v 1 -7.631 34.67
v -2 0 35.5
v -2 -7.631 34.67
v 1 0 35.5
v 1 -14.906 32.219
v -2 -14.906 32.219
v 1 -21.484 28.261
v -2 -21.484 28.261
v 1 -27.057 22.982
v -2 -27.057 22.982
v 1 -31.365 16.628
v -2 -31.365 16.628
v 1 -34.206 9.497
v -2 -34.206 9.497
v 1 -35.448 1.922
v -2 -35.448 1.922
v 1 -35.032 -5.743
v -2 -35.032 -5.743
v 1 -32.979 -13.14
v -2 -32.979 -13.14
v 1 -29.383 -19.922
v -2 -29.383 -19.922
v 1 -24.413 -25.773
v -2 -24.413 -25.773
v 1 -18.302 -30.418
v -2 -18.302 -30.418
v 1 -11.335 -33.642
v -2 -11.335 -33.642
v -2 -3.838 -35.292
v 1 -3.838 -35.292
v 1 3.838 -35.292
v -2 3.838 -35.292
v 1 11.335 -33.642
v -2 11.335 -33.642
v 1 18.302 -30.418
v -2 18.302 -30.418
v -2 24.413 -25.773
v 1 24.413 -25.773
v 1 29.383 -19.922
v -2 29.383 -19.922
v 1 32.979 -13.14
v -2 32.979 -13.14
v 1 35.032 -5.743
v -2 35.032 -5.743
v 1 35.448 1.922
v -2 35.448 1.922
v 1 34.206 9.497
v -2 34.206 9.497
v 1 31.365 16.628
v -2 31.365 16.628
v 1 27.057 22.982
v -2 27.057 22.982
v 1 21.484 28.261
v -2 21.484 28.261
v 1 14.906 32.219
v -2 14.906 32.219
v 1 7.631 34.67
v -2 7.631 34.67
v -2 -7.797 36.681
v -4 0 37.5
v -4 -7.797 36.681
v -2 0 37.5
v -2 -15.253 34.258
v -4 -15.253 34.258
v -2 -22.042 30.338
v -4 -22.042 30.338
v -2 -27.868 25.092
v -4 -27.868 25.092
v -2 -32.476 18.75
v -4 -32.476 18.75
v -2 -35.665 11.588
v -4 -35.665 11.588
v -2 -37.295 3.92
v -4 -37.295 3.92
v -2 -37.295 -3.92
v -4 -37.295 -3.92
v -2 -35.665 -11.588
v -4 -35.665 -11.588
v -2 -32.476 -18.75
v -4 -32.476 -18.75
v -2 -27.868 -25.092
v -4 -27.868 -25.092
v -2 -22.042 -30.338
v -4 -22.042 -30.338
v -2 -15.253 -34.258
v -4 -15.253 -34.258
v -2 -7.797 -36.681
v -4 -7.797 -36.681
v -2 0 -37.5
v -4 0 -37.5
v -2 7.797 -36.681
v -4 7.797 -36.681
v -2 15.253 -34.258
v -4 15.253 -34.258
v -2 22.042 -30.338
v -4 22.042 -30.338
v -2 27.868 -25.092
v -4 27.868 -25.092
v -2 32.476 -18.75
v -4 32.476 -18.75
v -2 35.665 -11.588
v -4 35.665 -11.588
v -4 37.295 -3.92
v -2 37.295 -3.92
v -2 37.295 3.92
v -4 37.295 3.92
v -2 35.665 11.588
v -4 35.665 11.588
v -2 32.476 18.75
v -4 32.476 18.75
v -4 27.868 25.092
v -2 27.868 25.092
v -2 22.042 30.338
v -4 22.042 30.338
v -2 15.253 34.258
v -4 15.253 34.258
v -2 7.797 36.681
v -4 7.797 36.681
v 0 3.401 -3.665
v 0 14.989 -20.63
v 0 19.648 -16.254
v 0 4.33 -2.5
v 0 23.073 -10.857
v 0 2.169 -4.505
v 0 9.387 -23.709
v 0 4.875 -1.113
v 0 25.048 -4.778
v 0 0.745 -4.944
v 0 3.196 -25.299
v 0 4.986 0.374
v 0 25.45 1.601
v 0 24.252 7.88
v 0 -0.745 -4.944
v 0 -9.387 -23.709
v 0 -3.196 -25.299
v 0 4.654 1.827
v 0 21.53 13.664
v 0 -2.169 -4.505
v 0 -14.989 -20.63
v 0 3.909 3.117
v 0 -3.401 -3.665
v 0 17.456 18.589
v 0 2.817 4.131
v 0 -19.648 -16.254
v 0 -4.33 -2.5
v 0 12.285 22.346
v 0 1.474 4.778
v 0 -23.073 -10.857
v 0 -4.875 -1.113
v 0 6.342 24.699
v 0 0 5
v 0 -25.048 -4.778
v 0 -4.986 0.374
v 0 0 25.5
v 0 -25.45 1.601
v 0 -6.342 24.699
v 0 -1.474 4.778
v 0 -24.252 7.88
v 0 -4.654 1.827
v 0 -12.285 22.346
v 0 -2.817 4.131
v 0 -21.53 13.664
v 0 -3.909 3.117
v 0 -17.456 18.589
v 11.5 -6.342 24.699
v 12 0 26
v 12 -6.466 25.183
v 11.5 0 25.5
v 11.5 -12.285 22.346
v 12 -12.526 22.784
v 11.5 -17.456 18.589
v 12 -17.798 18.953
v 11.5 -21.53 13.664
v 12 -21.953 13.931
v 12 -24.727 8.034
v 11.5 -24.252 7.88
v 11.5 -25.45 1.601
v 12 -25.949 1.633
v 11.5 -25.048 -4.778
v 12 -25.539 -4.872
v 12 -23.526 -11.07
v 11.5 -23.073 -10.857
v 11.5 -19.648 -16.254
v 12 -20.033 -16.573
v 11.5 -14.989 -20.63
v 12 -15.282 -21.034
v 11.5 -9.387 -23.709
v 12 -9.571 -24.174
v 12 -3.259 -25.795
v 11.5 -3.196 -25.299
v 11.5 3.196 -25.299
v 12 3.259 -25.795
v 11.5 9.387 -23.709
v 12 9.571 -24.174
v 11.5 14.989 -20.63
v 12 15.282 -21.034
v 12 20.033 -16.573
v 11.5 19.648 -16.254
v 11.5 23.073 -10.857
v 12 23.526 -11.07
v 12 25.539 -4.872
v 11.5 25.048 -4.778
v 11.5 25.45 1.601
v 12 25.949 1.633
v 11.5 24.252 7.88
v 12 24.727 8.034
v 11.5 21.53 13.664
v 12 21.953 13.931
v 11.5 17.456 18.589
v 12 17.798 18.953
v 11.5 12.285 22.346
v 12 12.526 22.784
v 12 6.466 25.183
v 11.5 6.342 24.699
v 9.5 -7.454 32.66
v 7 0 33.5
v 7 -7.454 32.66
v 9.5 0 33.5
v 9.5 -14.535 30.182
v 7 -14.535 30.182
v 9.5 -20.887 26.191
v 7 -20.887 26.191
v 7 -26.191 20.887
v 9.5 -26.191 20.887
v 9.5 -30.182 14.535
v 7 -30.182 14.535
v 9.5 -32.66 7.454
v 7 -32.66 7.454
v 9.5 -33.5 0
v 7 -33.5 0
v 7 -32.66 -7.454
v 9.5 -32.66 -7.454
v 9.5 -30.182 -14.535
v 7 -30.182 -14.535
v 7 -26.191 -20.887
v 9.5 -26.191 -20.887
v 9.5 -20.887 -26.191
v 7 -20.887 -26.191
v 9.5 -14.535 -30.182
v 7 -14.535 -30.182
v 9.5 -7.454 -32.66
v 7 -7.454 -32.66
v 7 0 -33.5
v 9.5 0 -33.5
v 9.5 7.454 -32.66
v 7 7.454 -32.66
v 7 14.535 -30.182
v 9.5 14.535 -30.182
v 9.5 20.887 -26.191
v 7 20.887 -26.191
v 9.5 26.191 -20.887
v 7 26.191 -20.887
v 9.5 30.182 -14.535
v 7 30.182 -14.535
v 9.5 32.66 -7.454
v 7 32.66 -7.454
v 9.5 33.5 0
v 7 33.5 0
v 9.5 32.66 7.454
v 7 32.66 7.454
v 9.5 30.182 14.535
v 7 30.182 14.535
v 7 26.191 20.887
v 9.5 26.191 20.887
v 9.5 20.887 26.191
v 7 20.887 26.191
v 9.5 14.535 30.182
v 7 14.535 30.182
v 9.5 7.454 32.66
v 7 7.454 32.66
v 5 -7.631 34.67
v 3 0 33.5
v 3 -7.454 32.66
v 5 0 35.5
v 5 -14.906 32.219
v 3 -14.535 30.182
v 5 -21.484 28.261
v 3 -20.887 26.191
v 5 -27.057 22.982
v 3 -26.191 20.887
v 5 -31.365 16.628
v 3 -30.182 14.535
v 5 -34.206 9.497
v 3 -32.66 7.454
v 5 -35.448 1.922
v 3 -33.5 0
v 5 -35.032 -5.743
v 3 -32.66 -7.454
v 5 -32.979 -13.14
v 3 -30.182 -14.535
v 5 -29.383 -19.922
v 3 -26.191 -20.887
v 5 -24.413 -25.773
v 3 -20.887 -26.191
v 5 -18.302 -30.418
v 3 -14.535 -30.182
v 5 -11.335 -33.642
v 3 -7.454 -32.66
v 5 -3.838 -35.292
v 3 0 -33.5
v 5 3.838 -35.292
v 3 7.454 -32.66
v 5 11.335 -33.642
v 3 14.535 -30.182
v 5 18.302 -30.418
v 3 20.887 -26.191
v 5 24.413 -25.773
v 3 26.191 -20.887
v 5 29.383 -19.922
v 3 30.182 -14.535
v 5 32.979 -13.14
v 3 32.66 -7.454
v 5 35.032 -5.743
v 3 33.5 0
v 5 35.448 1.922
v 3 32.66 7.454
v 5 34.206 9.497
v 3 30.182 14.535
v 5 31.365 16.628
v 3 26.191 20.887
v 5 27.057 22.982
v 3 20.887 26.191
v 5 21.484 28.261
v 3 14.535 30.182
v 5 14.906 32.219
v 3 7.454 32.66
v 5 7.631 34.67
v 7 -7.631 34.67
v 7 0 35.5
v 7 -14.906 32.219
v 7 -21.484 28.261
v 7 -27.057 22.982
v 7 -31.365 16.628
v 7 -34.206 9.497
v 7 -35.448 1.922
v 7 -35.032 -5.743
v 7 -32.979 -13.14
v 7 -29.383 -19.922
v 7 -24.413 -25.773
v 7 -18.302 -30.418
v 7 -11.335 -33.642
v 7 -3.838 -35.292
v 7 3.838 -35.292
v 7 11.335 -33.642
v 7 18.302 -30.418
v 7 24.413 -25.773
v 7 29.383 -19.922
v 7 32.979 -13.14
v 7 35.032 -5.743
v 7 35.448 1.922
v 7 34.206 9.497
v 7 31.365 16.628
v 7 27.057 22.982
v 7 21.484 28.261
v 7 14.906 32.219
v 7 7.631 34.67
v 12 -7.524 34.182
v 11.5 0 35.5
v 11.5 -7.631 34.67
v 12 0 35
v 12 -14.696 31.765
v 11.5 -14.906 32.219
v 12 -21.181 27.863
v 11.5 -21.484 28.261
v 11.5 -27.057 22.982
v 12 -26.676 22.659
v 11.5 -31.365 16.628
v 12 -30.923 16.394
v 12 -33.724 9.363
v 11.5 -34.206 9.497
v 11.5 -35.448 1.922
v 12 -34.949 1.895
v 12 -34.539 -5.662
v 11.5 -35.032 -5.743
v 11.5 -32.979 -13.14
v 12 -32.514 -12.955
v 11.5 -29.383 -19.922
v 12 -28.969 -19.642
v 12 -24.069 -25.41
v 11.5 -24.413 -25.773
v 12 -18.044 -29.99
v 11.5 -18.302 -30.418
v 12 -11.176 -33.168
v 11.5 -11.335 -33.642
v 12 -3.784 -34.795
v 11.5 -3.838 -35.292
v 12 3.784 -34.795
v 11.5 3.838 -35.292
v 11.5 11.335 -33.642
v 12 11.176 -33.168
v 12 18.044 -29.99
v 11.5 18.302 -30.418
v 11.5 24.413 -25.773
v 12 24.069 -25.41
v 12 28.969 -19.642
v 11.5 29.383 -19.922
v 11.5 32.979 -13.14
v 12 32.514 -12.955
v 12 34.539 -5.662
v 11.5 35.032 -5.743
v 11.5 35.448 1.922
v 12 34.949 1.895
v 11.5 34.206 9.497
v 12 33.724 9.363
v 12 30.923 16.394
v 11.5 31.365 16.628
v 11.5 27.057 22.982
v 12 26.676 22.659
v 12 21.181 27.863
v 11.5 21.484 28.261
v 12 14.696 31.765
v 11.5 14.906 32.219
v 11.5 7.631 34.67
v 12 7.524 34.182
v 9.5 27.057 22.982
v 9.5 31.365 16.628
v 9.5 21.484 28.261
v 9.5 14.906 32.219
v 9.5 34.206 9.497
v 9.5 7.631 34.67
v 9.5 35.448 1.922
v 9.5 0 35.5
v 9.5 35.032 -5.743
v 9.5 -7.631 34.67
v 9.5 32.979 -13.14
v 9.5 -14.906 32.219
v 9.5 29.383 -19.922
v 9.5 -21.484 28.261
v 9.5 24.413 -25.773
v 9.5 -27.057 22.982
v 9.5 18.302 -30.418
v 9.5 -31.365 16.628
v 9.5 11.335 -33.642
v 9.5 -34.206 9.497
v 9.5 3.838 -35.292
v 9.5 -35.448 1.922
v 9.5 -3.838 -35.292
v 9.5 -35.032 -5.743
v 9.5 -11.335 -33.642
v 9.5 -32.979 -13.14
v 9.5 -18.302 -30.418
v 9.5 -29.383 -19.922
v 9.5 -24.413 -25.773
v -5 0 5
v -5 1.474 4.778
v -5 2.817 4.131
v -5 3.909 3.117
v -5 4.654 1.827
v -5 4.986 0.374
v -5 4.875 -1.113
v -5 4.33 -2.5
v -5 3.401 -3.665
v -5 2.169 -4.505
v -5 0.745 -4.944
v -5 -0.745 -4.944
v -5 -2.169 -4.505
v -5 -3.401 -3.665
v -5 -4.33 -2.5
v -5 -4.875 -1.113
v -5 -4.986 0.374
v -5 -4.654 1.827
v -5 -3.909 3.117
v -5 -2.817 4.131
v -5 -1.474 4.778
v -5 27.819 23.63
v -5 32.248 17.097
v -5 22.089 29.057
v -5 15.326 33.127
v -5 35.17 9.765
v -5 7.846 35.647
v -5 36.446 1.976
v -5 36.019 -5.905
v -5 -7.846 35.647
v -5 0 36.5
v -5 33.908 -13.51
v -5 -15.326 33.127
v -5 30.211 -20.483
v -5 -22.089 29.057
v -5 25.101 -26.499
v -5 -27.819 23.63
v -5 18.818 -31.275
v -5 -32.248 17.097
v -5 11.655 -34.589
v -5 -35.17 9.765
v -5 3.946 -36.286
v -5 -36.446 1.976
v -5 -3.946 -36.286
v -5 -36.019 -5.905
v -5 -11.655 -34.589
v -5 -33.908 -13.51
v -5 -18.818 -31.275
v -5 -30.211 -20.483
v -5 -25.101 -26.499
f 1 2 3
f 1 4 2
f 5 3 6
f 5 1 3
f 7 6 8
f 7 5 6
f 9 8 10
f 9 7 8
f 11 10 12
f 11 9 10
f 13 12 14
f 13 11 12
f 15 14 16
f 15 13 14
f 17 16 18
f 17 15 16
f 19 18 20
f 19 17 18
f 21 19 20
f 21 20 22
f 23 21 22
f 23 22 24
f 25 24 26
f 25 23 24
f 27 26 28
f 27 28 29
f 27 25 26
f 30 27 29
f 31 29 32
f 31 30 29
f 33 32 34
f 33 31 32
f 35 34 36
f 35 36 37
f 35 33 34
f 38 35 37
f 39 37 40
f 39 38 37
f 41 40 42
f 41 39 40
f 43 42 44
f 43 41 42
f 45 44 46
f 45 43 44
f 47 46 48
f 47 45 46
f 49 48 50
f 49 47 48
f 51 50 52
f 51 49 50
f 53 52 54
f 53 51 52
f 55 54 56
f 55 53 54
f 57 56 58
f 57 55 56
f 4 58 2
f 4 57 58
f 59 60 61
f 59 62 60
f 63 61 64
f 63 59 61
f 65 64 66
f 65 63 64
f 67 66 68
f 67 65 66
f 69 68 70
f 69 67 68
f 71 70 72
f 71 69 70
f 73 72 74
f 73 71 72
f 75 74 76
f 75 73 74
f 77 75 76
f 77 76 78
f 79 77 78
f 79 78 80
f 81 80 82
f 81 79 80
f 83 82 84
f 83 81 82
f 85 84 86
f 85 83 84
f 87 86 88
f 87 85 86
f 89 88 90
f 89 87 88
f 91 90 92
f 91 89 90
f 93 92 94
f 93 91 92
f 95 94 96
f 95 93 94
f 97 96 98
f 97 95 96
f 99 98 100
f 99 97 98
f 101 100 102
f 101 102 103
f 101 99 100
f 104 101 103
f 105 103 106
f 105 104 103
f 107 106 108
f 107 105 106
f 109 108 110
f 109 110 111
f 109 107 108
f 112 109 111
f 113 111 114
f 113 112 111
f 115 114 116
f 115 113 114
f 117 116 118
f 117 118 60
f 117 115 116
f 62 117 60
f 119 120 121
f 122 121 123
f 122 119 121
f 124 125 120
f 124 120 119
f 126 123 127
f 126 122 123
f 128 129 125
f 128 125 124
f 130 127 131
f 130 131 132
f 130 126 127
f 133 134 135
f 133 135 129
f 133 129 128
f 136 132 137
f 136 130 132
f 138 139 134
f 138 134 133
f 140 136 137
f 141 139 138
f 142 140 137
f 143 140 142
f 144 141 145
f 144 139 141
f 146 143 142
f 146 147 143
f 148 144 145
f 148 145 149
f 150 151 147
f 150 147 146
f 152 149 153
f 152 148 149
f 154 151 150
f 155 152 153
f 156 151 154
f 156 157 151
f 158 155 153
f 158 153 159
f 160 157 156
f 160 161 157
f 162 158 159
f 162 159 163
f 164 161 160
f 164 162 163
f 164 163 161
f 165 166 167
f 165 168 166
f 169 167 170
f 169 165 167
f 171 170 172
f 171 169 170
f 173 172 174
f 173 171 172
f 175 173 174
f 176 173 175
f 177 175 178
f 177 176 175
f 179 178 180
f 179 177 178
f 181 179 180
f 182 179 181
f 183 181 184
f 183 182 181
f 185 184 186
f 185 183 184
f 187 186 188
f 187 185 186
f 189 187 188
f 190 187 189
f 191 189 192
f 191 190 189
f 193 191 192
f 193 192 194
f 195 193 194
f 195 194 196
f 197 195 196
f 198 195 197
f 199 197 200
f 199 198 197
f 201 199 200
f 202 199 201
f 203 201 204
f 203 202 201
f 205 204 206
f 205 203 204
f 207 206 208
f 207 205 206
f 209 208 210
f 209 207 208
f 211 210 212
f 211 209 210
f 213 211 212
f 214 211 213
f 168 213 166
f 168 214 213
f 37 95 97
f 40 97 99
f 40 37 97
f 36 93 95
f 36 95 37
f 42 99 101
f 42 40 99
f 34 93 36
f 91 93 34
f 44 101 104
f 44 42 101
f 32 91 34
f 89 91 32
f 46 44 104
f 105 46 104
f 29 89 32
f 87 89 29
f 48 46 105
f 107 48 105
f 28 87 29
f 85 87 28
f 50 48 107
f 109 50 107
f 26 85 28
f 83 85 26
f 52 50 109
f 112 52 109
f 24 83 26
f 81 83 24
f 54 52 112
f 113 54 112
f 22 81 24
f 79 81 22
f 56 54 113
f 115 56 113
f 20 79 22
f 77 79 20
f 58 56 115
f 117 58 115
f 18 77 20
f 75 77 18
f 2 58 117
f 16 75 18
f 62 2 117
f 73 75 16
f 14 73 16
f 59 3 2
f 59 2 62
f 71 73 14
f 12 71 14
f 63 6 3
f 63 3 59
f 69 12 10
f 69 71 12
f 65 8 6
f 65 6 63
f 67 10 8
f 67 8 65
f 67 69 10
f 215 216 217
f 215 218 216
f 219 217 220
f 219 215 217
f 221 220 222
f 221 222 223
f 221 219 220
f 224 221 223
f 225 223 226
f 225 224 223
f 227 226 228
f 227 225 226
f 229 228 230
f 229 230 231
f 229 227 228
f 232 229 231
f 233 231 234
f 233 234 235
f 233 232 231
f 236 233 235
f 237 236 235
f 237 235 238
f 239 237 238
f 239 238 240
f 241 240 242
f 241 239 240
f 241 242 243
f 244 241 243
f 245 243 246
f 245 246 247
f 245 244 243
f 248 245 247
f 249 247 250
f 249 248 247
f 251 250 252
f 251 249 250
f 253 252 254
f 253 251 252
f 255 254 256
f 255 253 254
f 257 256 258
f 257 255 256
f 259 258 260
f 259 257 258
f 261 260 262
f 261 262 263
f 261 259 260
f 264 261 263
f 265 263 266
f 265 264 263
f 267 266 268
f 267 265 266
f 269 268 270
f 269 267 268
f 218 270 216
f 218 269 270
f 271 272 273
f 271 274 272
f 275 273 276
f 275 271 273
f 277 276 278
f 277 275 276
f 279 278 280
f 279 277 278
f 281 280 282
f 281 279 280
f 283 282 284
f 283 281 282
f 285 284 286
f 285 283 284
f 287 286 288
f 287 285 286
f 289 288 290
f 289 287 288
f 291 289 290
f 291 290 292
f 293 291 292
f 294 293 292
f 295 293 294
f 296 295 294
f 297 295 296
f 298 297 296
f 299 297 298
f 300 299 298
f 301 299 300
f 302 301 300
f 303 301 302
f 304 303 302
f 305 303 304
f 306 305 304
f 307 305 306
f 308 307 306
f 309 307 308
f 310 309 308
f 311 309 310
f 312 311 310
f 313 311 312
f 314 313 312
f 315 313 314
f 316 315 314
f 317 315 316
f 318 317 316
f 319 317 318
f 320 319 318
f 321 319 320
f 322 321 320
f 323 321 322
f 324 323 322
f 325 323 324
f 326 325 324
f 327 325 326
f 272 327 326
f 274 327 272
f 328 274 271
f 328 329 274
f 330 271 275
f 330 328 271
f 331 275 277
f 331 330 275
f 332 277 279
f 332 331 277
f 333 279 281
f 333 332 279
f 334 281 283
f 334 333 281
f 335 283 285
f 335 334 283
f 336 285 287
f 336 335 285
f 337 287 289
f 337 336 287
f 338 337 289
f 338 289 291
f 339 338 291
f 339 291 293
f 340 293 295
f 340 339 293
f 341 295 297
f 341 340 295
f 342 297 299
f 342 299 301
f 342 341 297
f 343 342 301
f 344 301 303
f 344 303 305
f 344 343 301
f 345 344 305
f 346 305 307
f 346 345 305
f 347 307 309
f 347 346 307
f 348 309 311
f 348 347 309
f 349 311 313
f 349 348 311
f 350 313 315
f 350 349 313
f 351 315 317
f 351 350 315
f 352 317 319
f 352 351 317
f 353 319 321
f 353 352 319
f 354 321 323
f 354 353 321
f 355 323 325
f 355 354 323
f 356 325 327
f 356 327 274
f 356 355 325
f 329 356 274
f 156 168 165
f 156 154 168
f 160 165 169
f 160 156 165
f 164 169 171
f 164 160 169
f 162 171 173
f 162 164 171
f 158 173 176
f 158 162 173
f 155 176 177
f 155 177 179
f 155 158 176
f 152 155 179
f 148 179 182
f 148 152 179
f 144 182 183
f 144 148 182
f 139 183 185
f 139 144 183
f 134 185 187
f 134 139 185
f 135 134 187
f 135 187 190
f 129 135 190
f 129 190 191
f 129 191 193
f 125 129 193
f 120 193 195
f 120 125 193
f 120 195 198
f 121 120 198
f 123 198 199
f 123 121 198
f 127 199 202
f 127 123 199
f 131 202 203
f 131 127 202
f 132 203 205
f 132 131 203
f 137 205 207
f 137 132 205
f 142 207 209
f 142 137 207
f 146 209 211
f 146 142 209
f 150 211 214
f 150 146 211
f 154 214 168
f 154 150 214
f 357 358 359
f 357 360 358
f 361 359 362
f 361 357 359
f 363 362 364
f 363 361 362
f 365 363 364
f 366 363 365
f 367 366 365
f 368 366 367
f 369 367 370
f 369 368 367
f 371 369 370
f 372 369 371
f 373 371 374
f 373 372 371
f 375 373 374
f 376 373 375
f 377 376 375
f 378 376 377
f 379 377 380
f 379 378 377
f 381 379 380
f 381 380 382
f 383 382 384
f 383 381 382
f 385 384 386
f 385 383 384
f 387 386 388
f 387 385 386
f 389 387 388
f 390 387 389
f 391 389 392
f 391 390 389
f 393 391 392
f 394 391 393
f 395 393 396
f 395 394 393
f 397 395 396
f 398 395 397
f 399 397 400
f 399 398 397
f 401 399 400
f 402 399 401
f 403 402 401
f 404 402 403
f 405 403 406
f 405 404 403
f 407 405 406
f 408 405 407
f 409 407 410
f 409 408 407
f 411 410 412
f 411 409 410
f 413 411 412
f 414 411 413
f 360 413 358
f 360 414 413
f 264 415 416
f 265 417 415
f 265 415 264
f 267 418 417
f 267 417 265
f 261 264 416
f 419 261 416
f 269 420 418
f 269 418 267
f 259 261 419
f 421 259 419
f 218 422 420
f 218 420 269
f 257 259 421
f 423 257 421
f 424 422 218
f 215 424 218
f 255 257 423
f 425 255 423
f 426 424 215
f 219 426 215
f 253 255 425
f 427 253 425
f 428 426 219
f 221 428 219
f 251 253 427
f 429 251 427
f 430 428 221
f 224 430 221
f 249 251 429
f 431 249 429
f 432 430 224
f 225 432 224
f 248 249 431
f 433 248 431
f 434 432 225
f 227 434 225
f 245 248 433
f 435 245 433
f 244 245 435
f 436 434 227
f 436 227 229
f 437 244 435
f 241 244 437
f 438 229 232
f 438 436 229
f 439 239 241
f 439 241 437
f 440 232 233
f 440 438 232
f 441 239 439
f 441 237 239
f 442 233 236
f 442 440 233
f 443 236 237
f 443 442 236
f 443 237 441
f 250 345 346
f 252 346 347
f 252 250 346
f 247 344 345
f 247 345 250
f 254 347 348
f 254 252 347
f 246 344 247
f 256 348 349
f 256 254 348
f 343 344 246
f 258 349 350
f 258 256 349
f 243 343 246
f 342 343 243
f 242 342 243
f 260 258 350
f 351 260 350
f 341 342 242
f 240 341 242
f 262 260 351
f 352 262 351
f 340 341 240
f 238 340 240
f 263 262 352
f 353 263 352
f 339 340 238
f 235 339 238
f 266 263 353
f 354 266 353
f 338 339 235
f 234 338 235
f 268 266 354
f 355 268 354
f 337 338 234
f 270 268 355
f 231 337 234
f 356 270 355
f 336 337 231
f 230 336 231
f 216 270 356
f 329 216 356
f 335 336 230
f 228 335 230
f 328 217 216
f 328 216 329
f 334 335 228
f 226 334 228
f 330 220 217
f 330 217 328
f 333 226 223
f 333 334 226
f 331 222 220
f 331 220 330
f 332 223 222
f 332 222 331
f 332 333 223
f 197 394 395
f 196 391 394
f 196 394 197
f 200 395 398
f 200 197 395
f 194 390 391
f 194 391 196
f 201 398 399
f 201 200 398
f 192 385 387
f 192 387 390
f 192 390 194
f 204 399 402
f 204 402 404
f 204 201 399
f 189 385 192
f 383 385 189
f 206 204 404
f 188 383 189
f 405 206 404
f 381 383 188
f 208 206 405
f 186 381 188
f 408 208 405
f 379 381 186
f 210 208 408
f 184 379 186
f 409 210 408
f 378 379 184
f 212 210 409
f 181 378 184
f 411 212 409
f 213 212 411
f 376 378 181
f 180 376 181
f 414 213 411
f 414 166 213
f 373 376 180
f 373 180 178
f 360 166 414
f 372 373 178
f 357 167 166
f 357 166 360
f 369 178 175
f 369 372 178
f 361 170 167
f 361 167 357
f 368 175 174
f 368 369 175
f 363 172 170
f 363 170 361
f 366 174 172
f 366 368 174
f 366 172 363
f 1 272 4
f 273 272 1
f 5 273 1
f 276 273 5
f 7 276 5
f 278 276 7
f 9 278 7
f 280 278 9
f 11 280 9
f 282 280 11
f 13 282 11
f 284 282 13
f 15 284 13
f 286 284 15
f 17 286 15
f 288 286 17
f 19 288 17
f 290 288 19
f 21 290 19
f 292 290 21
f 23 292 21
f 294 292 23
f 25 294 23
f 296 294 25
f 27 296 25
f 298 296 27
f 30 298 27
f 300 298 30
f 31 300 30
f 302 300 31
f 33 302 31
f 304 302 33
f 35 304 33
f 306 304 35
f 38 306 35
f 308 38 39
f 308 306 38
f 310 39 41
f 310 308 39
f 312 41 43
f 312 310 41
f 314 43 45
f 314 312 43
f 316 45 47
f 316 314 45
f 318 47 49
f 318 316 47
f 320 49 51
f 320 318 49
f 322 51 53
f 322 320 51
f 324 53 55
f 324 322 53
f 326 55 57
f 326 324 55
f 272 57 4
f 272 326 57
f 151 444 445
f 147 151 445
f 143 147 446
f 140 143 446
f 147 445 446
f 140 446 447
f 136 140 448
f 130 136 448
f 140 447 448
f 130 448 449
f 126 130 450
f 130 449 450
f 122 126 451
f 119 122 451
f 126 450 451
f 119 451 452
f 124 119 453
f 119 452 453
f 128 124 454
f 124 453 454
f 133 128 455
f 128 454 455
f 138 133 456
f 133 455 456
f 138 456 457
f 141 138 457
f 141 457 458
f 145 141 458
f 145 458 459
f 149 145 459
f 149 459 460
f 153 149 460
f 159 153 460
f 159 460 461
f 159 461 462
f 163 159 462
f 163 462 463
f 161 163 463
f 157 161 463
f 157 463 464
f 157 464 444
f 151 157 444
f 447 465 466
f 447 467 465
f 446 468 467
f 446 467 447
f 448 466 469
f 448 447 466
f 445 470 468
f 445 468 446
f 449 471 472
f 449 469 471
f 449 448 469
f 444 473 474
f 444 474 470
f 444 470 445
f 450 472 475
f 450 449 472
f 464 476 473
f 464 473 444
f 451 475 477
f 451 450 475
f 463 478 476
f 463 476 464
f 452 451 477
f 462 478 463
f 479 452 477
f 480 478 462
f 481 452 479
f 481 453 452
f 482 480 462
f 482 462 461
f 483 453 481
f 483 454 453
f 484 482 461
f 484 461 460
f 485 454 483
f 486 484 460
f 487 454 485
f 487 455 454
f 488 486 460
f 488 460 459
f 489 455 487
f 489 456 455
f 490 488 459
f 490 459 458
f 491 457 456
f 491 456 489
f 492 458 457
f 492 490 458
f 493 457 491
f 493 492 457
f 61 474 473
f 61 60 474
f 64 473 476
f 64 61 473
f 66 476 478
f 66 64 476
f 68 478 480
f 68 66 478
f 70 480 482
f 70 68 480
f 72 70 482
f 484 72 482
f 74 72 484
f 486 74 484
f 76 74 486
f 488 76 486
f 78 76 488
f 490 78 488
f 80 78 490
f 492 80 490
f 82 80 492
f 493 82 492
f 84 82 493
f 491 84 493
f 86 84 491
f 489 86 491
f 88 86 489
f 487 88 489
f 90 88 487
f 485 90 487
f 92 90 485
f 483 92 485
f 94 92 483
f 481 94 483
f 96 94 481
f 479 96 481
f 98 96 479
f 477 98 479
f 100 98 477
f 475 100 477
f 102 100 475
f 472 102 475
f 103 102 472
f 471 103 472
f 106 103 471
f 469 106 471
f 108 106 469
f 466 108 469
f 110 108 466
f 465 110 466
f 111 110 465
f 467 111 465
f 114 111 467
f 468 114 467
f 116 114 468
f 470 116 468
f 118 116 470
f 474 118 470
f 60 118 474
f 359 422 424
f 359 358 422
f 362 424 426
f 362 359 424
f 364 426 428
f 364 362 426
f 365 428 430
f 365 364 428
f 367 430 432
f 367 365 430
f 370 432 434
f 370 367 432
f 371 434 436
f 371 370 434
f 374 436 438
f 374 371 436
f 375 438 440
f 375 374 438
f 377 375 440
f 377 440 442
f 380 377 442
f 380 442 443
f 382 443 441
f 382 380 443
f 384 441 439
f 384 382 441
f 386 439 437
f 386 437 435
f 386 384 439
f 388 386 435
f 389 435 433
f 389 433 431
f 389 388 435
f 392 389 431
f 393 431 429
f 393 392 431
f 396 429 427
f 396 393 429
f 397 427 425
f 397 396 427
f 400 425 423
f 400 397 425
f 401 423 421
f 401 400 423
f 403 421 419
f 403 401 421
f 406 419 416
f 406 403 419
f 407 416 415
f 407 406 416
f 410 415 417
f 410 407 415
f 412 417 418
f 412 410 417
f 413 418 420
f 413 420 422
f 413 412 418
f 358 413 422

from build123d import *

# Parameters (mm, degrees)
SKETCH_2_R          = 5
CUT_EXTRUDE_1_DEPTH = 10


with BuildPart() as part:
    # Эскиз1 → Повернуть1 (revolve)
    with BuildSketch(Plane.XY, mode=Mode.PRIVATE) as revolve_1_sk:
        Polygon((-5, 0), (-5, 36.5), (-4, 37.5), (-2, 37.5), (-2, 35.5), (1, 35.5), (3, 33.5), (5, 35.5), (7, 35.5), (7, 33.5), (9.5, 33.5), (9.5, 35.5), (11.5, 35.5), (12, 35), (12, 26), (11.5, 25.5), (0, 25.5), (0, 0), align=None)
    revolve(revolve_1_sk.sketch.rotate(Axis((0, 0, 0), (1, 0, 0)), 90), axis=Axis((0, 0, 0), (1, 0, 0)))

    # Эскиз2 → Вырез-Вытянуть1 (cut)
    with BuildSketch(Plane.ZY.offset(5)):
        Circle(SKETCH_2_R)
    extrude(amount=-CUT_EXTRUDE_1_DEPTH, mode=Mode.SUBTRACT)


solid = part.part
